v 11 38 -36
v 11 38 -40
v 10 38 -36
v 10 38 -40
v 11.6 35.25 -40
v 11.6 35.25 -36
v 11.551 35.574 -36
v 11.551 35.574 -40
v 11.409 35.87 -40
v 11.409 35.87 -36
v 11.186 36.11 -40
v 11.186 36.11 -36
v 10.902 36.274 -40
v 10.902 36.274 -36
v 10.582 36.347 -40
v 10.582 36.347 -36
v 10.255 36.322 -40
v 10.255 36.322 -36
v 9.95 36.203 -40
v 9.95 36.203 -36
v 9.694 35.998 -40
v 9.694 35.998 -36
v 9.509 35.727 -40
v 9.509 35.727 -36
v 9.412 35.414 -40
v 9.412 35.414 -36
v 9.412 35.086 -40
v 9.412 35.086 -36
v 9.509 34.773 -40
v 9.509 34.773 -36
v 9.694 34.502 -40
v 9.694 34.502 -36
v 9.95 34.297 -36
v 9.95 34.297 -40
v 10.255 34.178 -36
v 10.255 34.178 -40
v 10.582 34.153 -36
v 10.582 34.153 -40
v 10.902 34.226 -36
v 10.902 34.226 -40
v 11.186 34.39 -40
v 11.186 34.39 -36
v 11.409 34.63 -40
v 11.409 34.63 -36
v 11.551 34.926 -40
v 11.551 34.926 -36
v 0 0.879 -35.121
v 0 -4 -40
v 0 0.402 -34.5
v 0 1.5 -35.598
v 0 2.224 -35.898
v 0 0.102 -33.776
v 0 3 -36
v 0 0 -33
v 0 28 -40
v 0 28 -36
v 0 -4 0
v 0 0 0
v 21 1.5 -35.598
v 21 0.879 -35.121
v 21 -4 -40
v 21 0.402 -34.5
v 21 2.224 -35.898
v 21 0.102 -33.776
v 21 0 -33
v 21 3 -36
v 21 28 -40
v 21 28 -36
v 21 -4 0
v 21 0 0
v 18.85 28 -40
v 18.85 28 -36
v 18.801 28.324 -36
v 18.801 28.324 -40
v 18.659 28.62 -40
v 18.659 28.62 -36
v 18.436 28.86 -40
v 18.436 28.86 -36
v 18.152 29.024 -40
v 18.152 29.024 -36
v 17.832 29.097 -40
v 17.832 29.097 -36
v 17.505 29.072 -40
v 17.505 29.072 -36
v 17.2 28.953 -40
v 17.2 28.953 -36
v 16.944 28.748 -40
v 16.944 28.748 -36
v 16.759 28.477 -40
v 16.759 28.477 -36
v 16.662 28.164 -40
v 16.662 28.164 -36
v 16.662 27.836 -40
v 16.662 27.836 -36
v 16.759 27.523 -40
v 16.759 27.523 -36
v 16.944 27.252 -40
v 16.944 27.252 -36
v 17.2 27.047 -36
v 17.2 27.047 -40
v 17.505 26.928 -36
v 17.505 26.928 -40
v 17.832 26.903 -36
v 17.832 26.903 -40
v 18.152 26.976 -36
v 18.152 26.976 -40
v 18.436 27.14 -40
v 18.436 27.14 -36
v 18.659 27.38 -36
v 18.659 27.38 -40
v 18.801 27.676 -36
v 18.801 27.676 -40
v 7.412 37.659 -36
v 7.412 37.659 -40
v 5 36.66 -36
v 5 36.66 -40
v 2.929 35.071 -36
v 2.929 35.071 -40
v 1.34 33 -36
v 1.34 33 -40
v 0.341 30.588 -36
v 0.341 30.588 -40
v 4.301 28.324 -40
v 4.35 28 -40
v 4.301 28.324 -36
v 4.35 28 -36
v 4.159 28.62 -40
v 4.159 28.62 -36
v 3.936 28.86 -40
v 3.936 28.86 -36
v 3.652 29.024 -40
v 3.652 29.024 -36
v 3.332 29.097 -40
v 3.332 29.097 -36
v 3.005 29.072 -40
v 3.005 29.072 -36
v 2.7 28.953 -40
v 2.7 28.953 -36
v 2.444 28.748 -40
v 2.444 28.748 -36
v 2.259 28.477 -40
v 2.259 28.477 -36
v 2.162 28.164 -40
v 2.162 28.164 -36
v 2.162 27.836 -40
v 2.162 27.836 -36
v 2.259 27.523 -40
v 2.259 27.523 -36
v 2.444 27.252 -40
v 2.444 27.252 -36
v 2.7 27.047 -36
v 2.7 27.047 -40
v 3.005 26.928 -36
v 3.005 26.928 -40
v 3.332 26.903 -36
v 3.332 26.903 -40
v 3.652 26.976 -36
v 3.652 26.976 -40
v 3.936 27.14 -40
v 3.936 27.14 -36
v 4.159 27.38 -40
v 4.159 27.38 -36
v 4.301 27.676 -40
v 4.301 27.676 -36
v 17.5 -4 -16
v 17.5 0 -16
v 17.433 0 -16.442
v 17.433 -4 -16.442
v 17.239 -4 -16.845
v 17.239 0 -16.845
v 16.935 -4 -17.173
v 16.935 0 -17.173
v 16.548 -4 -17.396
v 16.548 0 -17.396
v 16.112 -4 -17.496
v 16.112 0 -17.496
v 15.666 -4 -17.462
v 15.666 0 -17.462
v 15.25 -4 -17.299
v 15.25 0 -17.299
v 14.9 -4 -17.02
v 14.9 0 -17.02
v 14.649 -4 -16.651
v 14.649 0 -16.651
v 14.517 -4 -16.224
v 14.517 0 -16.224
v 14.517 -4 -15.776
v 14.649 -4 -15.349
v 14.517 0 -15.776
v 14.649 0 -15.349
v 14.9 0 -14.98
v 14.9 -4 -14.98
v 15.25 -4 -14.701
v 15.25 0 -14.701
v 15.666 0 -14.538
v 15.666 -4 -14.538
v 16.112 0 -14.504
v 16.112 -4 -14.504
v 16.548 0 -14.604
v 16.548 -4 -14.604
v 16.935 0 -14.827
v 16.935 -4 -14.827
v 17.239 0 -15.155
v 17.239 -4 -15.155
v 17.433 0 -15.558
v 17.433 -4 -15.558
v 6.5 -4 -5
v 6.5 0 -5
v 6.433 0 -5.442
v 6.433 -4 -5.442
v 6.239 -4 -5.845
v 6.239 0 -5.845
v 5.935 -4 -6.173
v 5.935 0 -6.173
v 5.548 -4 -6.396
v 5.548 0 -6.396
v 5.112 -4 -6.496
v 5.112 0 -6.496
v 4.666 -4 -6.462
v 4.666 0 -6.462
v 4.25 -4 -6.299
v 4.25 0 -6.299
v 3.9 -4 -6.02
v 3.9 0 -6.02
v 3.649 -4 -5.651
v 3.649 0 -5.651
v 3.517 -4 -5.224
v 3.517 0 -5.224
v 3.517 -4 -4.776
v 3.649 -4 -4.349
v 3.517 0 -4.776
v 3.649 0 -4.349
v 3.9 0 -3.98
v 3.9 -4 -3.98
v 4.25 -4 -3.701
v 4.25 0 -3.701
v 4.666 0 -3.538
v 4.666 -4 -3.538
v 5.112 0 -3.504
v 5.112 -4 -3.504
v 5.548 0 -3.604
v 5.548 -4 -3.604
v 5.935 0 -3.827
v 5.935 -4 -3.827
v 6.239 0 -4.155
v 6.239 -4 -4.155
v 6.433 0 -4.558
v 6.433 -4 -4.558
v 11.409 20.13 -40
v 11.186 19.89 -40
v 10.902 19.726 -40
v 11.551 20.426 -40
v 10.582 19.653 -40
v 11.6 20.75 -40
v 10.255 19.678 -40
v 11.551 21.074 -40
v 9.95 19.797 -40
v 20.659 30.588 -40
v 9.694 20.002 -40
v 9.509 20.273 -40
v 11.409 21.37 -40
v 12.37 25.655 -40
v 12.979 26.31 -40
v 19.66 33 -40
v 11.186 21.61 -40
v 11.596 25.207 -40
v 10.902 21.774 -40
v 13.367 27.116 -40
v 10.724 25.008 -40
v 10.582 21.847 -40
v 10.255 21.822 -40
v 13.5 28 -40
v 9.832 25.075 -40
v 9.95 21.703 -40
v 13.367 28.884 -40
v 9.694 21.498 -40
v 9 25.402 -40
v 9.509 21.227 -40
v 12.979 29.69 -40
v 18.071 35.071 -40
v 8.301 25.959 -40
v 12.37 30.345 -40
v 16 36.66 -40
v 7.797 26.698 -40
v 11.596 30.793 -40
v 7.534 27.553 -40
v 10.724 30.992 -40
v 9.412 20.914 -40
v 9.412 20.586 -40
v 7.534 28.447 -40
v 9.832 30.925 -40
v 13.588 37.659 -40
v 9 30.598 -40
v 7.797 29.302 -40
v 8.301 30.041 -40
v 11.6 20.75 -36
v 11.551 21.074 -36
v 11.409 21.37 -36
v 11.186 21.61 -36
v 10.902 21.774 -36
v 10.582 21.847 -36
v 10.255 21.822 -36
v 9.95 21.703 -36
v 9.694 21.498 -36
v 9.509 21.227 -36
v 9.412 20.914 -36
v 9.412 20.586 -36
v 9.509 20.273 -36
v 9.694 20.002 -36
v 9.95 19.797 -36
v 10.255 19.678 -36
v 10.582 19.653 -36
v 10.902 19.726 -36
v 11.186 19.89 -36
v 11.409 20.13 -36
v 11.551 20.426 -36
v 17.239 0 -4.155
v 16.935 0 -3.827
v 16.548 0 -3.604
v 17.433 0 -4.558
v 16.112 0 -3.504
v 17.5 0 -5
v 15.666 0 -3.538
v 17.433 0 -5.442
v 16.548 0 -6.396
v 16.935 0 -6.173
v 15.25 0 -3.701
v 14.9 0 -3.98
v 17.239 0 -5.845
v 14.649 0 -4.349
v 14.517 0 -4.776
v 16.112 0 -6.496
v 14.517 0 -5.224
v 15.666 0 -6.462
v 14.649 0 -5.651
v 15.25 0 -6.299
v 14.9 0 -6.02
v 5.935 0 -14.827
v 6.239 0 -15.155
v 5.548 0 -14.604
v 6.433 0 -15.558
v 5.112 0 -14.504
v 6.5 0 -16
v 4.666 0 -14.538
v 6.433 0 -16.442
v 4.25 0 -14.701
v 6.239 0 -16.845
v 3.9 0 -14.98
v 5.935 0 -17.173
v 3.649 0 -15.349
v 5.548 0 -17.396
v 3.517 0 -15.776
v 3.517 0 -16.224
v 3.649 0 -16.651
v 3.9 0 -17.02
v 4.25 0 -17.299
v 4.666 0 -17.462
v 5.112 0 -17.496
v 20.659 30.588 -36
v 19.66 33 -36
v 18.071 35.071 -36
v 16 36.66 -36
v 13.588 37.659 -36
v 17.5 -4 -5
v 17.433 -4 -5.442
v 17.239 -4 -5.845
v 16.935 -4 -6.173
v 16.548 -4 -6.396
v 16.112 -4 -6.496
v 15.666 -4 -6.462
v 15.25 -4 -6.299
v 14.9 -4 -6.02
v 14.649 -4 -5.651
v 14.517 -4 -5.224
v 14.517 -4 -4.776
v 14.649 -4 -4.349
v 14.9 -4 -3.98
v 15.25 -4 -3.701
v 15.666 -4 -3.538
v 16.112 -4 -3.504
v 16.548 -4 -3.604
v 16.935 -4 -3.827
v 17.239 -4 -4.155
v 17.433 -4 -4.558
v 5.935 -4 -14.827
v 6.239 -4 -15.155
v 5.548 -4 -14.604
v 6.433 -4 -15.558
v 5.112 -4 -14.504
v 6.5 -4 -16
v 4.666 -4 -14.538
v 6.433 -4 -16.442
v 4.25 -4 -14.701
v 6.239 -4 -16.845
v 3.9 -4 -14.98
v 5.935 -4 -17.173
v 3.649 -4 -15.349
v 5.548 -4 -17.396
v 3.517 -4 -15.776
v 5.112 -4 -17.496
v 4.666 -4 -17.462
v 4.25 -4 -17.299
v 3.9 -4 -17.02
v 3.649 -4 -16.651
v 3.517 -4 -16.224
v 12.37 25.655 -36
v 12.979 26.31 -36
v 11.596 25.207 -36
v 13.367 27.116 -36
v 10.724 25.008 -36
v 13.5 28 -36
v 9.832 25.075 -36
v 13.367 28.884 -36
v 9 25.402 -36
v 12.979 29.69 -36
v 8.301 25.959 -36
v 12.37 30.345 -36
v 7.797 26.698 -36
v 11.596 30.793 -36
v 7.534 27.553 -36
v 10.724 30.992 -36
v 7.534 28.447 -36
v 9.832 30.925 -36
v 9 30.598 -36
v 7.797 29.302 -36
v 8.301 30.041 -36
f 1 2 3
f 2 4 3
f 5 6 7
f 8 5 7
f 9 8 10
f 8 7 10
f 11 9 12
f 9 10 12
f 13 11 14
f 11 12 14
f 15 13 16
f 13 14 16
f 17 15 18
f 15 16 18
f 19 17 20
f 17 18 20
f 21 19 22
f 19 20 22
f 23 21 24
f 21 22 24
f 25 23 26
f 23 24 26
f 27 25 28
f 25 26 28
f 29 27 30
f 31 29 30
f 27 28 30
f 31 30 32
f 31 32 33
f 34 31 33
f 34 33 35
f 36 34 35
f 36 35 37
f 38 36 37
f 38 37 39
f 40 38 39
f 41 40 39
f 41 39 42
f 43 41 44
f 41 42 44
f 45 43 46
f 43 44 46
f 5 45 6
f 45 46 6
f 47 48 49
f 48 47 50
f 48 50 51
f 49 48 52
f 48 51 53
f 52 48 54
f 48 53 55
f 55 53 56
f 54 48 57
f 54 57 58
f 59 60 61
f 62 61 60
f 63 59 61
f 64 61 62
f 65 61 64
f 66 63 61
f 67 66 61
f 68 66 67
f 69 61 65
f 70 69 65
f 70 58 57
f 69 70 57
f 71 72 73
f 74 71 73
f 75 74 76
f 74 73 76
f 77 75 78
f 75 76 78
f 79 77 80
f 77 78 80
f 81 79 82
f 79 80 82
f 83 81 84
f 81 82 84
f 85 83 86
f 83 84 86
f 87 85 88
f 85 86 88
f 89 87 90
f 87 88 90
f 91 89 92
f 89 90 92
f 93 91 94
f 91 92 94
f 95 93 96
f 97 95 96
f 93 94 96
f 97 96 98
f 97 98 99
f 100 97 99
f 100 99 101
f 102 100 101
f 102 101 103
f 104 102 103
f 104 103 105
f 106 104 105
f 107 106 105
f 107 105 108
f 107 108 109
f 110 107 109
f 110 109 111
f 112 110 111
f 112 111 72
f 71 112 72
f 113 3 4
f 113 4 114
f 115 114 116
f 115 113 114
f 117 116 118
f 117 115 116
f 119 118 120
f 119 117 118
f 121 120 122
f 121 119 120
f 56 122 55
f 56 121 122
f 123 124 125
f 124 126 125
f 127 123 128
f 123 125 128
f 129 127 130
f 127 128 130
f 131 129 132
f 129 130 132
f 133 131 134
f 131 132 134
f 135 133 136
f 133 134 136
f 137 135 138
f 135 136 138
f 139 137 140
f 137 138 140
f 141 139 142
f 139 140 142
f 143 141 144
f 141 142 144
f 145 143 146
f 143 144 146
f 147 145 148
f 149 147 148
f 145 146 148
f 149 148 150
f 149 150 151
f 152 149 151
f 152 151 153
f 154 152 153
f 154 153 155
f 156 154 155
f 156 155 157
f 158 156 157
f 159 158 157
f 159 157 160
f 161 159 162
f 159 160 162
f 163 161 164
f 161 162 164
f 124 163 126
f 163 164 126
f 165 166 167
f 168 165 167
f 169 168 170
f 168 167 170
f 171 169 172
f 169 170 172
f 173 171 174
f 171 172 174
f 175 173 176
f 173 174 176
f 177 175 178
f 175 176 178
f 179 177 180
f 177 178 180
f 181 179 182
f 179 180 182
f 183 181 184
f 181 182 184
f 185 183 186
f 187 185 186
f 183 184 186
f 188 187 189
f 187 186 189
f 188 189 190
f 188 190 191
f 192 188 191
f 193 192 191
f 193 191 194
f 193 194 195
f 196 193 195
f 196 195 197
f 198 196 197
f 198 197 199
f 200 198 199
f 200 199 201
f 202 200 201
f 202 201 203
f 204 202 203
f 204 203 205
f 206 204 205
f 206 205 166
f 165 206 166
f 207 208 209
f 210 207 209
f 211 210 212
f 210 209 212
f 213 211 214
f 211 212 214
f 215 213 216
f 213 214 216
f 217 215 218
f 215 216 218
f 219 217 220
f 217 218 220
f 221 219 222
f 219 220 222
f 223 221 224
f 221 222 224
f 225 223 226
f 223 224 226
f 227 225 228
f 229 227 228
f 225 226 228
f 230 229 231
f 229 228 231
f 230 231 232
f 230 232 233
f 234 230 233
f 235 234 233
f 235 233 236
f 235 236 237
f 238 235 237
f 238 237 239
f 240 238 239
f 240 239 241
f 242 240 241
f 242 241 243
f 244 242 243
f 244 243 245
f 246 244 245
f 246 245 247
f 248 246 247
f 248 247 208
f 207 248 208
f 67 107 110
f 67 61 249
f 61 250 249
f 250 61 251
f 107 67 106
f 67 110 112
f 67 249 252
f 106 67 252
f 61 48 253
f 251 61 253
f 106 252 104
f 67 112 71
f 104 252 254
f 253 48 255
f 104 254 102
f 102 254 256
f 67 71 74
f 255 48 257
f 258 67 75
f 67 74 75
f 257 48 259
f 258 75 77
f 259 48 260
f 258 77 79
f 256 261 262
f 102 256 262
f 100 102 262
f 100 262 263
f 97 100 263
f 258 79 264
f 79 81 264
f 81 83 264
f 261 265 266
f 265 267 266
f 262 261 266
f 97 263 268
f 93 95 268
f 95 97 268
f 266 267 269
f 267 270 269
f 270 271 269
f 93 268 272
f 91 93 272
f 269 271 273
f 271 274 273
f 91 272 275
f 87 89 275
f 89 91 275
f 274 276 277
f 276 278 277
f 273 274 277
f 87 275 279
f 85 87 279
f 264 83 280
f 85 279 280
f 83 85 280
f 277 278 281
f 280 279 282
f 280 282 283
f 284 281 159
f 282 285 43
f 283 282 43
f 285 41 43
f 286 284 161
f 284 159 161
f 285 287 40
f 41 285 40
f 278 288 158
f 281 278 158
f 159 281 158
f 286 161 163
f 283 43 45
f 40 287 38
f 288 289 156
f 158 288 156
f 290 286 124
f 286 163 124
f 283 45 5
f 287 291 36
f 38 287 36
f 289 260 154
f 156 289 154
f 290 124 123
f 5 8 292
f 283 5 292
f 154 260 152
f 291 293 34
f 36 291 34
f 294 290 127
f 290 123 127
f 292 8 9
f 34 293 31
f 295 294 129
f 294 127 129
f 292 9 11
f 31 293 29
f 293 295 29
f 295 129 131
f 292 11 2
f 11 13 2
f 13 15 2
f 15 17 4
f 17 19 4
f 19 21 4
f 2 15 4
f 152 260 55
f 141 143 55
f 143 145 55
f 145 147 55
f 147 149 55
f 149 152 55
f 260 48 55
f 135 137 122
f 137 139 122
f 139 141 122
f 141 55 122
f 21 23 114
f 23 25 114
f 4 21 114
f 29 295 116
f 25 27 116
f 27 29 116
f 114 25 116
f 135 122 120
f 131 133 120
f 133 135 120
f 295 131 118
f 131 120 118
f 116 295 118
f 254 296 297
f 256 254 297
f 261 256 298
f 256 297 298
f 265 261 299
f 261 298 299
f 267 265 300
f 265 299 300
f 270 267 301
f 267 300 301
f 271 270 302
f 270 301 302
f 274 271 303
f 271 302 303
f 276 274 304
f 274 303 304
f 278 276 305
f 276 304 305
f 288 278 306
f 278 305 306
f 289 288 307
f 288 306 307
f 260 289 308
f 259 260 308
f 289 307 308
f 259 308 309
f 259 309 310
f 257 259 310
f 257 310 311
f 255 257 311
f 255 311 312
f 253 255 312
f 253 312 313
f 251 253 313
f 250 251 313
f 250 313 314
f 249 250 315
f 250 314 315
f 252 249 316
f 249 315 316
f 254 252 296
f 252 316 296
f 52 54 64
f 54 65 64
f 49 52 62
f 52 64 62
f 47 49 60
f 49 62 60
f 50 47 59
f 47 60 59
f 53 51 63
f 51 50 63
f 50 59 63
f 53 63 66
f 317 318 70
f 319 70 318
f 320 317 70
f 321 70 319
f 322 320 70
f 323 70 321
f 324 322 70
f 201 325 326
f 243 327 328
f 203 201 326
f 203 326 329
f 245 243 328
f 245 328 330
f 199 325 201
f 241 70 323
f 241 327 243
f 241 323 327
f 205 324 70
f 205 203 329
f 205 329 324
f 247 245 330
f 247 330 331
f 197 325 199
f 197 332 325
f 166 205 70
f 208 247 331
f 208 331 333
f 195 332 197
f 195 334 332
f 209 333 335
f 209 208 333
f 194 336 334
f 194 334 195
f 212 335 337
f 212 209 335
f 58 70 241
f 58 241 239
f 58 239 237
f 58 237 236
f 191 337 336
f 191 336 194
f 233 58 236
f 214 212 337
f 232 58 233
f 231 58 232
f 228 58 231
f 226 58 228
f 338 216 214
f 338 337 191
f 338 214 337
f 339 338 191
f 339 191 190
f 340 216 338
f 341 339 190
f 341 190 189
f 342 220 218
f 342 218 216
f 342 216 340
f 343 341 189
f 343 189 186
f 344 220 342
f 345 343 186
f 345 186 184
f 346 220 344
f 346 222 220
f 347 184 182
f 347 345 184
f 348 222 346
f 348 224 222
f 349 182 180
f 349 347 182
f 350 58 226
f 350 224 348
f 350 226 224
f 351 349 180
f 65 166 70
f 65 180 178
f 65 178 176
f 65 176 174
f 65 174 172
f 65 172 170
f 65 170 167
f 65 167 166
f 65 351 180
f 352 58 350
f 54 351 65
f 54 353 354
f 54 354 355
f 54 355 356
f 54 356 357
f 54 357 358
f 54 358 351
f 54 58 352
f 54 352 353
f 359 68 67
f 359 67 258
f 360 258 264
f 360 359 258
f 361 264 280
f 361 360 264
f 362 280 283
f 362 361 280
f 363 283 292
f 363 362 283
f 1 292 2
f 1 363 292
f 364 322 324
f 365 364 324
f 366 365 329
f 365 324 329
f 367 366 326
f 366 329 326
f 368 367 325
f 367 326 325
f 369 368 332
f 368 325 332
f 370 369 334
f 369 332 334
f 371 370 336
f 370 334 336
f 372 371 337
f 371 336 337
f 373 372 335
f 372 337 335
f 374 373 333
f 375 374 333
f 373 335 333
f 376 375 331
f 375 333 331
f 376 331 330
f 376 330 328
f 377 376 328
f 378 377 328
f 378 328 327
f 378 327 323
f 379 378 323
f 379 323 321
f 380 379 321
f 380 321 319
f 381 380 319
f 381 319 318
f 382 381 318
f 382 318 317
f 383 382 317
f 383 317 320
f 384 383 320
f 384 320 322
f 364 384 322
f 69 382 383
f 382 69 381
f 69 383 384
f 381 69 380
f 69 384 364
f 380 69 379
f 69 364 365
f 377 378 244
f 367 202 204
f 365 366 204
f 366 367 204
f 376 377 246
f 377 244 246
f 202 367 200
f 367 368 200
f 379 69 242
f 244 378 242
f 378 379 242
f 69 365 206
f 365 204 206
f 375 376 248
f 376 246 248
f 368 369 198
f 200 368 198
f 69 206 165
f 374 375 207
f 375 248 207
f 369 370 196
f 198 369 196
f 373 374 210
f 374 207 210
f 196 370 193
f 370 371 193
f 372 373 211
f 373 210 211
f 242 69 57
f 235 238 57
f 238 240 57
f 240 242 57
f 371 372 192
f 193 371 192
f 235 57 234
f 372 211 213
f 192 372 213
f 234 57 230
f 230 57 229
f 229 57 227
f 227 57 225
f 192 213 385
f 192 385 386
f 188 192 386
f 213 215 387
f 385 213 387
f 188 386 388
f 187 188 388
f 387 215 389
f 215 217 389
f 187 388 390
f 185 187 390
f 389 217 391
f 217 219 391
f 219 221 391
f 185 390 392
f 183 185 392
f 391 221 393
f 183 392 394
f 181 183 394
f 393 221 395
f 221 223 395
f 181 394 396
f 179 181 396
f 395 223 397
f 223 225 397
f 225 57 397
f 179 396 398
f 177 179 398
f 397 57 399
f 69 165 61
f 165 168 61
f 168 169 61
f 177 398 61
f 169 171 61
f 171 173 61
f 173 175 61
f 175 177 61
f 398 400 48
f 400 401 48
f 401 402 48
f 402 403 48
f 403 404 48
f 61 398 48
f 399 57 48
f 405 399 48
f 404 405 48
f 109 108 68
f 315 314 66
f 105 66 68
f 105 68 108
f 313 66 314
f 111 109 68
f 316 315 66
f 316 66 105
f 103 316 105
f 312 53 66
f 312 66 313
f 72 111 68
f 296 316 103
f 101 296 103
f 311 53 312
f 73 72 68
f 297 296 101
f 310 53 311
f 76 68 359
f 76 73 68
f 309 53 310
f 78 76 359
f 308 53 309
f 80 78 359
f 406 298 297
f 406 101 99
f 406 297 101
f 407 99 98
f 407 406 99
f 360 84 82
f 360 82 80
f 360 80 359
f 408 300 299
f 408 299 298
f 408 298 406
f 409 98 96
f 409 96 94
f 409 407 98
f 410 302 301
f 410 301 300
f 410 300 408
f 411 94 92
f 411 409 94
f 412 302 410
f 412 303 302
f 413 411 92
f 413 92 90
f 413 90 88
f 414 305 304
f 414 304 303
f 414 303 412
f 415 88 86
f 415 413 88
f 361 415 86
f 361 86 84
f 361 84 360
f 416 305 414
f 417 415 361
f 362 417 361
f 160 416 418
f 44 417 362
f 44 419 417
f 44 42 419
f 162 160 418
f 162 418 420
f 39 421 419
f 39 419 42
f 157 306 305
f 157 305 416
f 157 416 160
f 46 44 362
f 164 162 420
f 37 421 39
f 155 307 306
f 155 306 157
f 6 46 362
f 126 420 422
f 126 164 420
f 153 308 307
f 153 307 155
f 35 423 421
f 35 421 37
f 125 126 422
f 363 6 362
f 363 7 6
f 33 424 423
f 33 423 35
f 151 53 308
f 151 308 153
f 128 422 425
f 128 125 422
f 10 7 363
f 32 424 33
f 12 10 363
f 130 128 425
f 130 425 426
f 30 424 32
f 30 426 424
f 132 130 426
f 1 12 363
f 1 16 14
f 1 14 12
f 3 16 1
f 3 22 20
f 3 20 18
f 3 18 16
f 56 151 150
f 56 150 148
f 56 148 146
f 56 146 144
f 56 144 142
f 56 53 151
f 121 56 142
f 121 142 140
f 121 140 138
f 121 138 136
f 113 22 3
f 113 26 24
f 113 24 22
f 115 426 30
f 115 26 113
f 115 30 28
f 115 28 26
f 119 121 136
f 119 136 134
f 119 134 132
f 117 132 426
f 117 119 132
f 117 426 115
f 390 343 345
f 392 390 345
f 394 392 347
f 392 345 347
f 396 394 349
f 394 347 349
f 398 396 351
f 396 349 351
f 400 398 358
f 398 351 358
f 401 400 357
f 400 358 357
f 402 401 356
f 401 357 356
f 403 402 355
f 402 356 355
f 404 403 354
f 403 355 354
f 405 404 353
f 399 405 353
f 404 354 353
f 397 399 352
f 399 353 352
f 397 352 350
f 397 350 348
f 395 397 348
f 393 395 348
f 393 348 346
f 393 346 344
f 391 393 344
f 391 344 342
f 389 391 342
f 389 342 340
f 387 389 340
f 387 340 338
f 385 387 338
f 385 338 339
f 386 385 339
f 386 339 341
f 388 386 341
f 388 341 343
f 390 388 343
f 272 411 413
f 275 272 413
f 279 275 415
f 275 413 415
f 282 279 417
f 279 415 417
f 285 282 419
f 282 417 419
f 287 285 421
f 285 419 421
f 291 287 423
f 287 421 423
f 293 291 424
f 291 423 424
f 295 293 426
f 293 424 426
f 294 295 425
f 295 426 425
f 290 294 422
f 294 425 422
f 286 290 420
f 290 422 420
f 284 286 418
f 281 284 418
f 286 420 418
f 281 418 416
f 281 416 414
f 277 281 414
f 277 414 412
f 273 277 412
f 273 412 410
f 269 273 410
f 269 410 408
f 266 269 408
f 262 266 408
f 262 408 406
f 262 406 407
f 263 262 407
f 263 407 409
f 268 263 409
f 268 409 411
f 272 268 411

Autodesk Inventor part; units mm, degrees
ref_plane "YZ Plane" through (0, 0, 0) normal (1, 0, 0) x (0, 1, 0)
ref_plane "XZ Plane" through (0, 0, 0) normal (0, 1, 0) x (-1, 0, 0)
ref_plane "XY Plane" through (0, 0, 0) normal (0, 0, 1) x (1, 0, 0)
sketch "Sketch1" plane through (0, 0, 0) normal (1, 0, 0) x (0, 1, 0)
  line L0 (0, 0) -> (0, -36)
  line L1 (0, -36) -> (38, -36)
  line L2 (0, 0) -> (-4, 0)
  line L3 (-4, 0) -> (-4, -40)
  line L4 (-4, -40) -> (38, -40)
  line L5 (38, -40) -> (38, -36)
  dimension "d0" = 36
  dimension "d1" = 38
  dimension "d2" = 4
  dimension "d3" = 40
extrude "Extrusion1" add sketch "Sketch1" along normal blind 21
fillet "Fillet1" radius 10 2 edges at (21, 38, -38) (0, 38, -38)
sketch "Sketch2" plane through (0, 0, -36) normal (0, 0, 1) x (1, 0, 0)
  arc A0 (10, 38) -> (0, 28) centre (10, 28) ccw projected
  line L0 (0, 28) -> (21, 28)
  line L1 (0, 28) -> (0, 0) projected
  line L2 (0, 28) -> (10.5, 28)
  circle A1 centre (10.5, 28) radius 8
  circle A2 centre (10.5, 28) radius 6.5
  line L3 (4, 28) -> (2.5, 28)
  circle A3 centre (3.25, 28) radius 1.1
  line L4 (17, 28) -> (18.5, 28)
  circle A4 centre (17.75, 28) radius 1.1
  line L5 (10.5, 28) -> (10.5, 36)
  line L6 (10.5, 28) -> (10.5, 20)
  line L7 (10.5, 36) -> (10.5, 34.5)
  line L8 (10.5, 20) -> (10.5, 21.5)
  circle A5 centre (10.5, 35.25) radius 1.1
  circle A6 centre (10.5, 20.75) radius 1.1
  circle A7 centre (10.5, 28) radius 3
  dimension "d7" = 10.5
  dimension "d8" = 16
  dimension "d9" = 13
  dimension "d10" = 2.2
  dimension "d11" = 2.2
  dimension "d12" = 2.2
  dimension "d13" = 2.2
  dimension "d14" = 6
extrude "Extrusion2" cut sketch "Sketch2" against normal blind 21 contours A2 A3 A1 L0 | A2 A3 L0 | L0 A1 A3 A2 | L0 A3 A2 | A1 A3 L0 | L0 A3 A1 | A7 L5 L0 | L0 L6 A7 | A5 A1 L5 A2 | A2 L5 A5 | A6 L6 A2 | A2 L6 A1 A6 | A5 A1 | A1 A6 | L5 A7 L0 | L0 A7 L6 | L5 A1 A5 A2 | A2 A5 L5 | L6 A6 A2 | A2 A6 A1 L6 | A4 L0 A1 | A1 L0 A2 A4 | A4 A2 L0 A1 | A1 L0 A4 | A4 A2 L0 | L0 A2 A4
sketch "Sketch3" plane through (0, 0, 0) normal (0, 1, 0) x (1, 0, 0)
  line L0 (0, 36) -> (0, 0) projected
  line L1 (0, 0) -> (5, 0)
  line L2 (5, 0) -> (5, 5)
  line L3 (5, 5) -> (0, 5)
  line L4 (0, 5) -> (0, 0)
  line L5 (5, 5) -> (16, 5)
  line L6 (16, 5) -> (16, 16)
  line L7 (16, 16) -> (5, 16)
  line L8 (5, 16) -> (5, 5)
  circle A0 centre (5, 5) radius 1.5
  circle A1 centre (5, 16) radius 1.5
  circle A2 centre (16, 5) radius 1.5
  circle A3 centre (16, 16) radius 1.5
  dimension "d17" = 5
  dimension "d18" = 5
  dimension "d19" = 11
  dimension "d20" = 11
  dimension "d21" = 3
  dimension "d22" = 3
  dimension "d23" = 3
  dimension "d24" = 3
extrude "Extrusion3" cut sketch "Sketch3" against normal blind 21 contours A0 L8 L3 | L3 L2 A0 | L5 A0 L2 | L8 A0 L5 | A1 L7 L8 | L8 L7 A1 | A2 L6 L5 | L5 L6 A2 | A3 L6 L7 | L7 L6 A3
fillet "Fillet2" radius 3 1 edges at (10.5, 0, -36)
properties part number "L1"
